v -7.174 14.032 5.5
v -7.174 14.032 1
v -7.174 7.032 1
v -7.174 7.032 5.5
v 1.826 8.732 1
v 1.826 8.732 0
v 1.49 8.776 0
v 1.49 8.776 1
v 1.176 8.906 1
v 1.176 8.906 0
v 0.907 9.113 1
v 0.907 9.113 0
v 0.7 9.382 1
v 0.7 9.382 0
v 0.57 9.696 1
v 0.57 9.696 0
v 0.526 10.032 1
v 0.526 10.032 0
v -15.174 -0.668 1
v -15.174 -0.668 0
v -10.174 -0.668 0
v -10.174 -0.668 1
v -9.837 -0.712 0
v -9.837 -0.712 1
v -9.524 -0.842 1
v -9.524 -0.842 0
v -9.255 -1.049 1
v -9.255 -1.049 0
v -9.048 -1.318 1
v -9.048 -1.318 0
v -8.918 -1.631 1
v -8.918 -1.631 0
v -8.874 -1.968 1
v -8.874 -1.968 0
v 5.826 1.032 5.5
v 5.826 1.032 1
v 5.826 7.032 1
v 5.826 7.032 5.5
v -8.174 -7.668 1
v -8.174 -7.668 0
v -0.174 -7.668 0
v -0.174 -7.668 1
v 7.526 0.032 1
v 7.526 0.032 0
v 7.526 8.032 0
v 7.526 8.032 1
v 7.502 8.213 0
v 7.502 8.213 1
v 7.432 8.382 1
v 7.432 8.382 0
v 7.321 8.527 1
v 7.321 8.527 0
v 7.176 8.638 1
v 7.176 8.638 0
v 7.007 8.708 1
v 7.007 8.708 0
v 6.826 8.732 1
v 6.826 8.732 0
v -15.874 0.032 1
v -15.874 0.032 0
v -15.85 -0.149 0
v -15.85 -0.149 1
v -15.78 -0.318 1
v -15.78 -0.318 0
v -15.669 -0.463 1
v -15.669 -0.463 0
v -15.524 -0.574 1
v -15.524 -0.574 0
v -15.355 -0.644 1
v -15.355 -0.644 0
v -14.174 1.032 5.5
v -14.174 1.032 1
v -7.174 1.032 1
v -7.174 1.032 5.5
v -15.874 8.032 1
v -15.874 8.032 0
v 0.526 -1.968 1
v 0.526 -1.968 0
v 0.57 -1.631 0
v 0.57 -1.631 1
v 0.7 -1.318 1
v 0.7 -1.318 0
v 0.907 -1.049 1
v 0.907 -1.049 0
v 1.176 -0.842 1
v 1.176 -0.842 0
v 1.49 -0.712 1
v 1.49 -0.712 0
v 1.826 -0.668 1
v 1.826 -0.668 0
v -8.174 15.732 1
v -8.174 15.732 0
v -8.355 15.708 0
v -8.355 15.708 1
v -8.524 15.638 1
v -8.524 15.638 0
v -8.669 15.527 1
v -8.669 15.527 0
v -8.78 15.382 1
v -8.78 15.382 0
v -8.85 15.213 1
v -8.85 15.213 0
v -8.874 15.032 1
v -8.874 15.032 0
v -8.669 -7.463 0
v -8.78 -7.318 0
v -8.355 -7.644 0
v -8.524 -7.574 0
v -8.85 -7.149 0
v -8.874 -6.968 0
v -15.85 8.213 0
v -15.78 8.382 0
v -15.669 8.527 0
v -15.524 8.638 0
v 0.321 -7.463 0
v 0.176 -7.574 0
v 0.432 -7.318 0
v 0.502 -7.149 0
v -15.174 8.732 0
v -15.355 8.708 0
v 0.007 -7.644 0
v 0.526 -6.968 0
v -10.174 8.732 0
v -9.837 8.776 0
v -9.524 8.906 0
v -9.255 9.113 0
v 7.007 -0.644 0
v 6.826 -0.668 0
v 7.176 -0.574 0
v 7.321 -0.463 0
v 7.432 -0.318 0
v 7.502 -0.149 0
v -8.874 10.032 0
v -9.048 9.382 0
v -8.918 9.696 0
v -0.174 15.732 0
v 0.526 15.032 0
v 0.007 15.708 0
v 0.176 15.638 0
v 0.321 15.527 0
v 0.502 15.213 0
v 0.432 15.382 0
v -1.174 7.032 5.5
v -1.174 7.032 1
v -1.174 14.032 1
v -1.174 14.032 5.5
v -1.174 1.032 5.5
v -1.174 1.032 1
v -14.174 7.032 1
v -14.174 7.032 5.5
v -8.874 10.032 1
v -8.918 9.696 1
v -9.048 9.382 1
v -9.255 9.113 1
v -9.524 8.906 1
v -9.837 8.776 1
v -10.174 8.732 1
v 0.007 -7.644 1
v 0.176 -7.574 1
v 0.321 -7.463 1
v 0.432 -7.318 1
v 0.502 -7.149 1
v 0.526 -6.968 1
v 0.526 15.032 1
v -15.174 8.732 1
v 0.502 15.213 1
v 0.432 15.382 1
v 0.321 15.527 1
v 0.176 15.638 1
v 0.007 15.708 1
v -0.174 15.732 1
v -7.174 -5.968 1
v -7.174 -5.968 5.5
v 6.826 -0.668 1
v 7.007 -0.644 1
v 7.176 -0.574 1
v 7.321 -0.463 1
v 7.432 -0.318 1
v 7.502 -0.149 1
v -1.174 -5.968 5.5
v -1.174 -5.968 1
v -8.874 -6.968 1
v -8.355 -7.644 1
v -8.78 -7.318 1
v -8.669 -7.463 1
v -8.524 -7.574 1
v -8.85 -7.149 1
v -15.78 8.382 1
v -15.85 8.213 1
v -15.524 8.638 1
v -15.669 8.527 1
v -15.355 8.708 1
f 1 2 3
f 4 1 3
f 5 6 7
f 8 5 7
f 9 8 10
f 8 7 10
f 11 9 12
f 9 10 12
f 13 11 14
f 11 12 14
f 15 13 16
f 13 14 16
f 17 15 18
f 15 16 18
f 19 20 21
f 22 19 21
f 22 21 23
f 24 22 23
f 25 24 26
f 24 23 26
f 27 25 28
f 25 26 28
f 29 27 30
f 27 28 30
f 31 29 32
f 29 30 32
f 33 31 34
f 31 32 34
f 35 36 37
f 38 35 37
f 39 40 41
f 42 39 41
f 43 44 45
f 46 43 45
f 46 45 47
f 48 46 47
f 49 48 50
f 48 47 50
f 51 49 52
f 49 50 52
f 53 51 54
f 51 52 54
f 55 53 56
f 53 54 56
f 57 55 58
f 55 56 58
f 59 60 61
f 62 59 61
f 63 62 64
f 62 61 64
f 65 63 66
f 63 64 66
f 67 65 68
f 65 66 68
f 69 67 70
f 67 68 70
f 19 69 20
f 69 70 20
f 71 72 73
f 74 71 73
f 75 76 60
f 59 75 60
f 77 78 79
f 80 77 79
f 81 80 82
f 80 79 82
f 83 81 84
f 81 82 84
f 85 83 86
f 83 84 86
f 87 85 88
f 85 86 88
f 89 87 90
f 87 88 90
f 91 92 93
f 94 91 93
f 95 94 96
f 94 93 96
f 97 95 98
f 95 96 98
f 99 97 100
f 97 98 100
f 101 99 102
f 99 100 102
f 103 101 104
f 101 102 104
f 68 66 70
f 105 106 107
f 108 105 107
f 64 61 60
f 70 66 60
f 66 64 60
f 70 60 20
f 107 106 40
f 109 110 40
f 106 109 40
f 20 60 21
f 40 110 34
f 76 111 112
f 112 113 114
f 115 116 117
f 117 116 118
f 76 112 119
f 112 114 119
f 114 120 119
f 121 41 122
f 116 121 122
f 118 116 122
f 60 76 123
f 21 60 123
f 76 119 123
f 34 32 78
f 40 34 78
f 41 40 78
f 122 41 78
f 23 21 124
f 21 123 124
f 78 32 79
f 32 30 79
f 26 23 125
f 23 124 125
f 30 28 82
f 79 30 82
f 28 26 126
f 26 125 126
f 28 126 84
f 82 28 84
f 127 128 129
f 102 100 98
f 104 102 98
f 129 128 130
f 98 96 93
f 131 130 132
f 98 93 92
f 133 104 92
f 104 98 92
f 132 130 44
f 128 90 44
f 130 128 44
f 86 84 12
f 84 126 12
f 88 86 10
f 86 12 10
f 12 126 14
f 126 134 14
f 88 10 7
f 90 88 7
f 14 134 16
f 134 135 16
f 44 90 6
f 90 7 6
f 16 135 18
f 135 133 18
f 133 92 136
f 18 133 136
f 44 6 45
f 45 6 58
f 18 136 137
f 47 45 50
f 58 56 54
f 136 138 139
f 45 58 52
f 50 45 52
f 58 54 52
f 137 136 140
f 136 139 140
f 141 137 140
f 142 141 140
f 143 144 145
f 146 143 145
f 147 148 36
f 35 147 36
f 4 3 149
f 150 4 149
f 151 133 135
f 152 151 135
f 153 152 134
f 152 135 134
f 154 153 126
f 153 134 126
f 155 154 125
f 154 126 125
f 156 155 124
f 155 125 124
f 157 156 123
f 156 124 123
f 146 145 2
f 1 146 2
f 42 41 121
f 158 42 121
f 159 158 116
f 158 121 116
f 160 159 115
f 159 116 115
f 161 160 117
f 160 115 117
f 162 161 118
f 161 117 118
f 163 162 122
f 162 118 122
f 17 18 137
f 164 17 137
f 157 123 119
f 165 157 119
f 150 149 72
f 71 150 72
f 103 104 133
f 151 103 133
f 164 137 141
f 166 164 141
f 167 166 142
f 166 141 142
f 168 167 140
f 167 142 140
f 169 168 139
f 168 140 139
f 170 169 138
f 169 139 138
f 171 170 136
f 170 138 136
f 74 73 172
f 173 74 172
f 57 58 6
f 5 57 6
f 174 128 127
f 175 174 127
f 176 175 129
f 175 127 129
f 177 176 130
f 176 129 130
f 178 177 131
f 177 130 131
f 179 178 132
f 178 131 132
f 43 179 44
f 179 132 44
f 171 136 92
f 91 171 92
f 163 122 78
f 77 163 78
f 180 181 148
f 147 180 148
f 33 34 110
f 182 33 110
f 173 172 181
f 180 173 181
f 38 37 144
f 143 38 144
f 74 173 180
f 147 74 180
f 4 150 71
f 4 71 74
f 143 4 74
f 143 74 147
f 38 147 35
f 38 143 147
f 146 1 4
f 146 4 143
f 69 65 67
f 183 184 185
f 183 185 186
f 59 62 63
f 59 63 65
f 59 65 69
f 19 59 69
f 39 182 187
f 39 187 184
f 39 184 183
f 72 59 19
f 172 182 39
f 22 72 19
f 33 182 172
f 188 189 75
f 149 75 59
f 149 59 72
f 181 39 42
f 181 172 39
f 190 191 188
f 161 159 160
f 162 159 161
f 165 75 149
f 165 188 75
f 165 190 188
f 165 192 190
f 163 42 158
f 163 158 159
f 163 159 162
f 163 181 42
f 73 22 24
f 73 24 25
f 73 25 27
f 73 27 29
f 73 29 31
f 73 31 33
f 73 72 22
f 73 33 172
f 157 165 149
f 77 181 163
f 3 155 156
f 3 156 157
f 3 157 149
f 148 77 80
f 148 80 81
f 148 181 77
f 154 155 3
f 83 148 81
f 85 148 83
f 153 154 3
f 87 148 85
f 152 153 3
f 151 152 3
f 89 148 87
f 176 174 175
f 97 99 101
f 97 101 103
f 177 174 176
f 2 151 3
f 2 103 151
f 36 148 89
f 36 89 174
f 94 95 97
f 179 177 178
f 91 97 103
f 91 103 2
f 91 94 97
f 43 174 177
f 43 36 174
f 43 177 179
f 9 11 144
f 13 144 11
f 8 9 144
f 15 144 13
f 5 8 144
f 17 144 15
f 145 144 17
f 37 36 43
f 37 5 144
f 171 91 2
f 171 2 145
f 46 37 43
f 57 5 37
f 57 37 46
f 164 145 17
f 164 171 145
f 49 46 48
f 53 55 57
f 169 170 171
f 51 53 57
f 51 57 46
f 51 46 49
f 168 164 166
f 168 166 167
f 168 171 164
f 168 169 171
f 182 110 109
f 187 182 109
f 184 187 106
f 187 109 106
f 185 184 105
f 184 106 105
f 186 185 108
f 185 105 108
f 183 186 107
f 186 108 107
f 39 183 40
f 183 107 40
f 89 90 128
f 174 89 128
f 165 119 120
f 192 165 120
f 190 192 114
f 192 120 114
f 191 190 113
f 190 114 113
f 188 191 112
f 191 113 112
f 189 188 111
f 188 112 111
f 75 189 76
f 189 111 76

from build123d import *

# Parameters (mm, degrees)
BOSS_EXTRUDE1_DEPTH = 5.5
BOSS_EXTRUDE2_DEPTH = 1


with BuildPart() as part:
    # Sketch1 → Boss-Extrude1 (new body)
    with BuildSketch(Plane.XY):
        Polygon((-14.173922558, 7.032133424), (-14.173922558, 1.032133424), (-7.173922558, 1.032133424), (-7.173922558, -5.967866576), (-1.173922558, -5.967866576), (-1.173922558, 1.032133424), (5.826077442, 1.032133424), (5.826077442, 7.032133424), (-1.173922558, 7.032133424), (-1.173922558, 14.032133424), (-7.173922558, 14.032133424), (-7.173922558, 7.032133424), align=None)
    extrude(amount=BOSS_EXTRUDE1_DEPTH)

    # Sketch2 → Boss-Extrude2 (add)
    with BuildSketch(Plane.XY):
        with BuildLine():
            Line((-15.873922558, 8.032133424), (-15.873922558, 0.032133424))
            ThreePointArc((-15.873922558, 0.032133424), (-15.668897304, -0.462841323), (-15.173922558, -0.667866576))
            Line((-15.173922558, -0.667866576), (-10.173922558, -0.667866576))
            ThreePointArc((-10.173922558, -0.667866576), (-9.254683742, -1.048627761), (-8.873922558, -1.967866576))
            Line((-8.873922558, -1.967866576), (-8.873922558, -6.967866576))
            ThreePointArc((-8.873922558, -6.967866576), (-8.668897304, -7.462841323), (-8.173922558, -7.667866576))
            Line((-8.173922558, -7.667866576), (-0.173922558, -7.667866576))
            ThreePointArc((-0.173922558, -7.667866576), (0.321052189, -7.462841323), (0.526077442, -6.967866576))
            Line((0.526077442, -6.967866576), (0.526077442, -1.967866576))
            ThreePointArc((0.526077442, -1.967866576), (0.906838627, -1.048627761), (1.826077442, -0.667866576))
            Line((1.826077442, -0.667866576), (6.826077442, -0.667866576))
            ThreePointArc((6.826077442, -0.667866576), (7.321052189, -0.462841323), (7.526077442, 0.032133424))
            Line((7.526077442, 0.032133424), (7.526077442, 8.032133424))
            ThreePointArc((7.526077442, 8.032133424), (7.321052189, 8.527108171), (6.826077442, 8.732133424))
            Line((6.826077442, 8.732133424), (1.826077442, 8.732133424))
            ThreePointArc((1.826077442, 8.732133424), (0.906838627, 9.112894608), (0.526077442, 10.032133424))
            Line((0.526077442, 10.032133424), (0.526077442, 15.032133424))
            ThreePointArc((0.526077442, 15.032133424), (0.321052189, 15.527108171), (-0.173922558, 15.732133424))
            Line((-0.173922558, 15.732133424), (-8.173922558, 15.732133424))
            ThreePointArc((-8.173922558, 15.732133424), (-8.668897304, 15.527108171), (-8.873922558, 15.032133424))
            Line((-8.873922558, 15.032133424), (-8.873922558, 10.032133424))
            ThreePointArc((-8.873922558, 10.032133424), (-9.254683742, 9.112894608), (-10.173922558, 8.732133424))
            Line((-10.173922558, 8.732133424), (-15.173922558, 8.732133424))
            ThreePointArc((-15.173922558, 8.732133424), (-15.668897304, 8.527108171), (-15.873922558, 8.032133424))
        make_face()
    extrude(amount=BOSS_EXTRUDE2_DEPTH)


solid = part.part
